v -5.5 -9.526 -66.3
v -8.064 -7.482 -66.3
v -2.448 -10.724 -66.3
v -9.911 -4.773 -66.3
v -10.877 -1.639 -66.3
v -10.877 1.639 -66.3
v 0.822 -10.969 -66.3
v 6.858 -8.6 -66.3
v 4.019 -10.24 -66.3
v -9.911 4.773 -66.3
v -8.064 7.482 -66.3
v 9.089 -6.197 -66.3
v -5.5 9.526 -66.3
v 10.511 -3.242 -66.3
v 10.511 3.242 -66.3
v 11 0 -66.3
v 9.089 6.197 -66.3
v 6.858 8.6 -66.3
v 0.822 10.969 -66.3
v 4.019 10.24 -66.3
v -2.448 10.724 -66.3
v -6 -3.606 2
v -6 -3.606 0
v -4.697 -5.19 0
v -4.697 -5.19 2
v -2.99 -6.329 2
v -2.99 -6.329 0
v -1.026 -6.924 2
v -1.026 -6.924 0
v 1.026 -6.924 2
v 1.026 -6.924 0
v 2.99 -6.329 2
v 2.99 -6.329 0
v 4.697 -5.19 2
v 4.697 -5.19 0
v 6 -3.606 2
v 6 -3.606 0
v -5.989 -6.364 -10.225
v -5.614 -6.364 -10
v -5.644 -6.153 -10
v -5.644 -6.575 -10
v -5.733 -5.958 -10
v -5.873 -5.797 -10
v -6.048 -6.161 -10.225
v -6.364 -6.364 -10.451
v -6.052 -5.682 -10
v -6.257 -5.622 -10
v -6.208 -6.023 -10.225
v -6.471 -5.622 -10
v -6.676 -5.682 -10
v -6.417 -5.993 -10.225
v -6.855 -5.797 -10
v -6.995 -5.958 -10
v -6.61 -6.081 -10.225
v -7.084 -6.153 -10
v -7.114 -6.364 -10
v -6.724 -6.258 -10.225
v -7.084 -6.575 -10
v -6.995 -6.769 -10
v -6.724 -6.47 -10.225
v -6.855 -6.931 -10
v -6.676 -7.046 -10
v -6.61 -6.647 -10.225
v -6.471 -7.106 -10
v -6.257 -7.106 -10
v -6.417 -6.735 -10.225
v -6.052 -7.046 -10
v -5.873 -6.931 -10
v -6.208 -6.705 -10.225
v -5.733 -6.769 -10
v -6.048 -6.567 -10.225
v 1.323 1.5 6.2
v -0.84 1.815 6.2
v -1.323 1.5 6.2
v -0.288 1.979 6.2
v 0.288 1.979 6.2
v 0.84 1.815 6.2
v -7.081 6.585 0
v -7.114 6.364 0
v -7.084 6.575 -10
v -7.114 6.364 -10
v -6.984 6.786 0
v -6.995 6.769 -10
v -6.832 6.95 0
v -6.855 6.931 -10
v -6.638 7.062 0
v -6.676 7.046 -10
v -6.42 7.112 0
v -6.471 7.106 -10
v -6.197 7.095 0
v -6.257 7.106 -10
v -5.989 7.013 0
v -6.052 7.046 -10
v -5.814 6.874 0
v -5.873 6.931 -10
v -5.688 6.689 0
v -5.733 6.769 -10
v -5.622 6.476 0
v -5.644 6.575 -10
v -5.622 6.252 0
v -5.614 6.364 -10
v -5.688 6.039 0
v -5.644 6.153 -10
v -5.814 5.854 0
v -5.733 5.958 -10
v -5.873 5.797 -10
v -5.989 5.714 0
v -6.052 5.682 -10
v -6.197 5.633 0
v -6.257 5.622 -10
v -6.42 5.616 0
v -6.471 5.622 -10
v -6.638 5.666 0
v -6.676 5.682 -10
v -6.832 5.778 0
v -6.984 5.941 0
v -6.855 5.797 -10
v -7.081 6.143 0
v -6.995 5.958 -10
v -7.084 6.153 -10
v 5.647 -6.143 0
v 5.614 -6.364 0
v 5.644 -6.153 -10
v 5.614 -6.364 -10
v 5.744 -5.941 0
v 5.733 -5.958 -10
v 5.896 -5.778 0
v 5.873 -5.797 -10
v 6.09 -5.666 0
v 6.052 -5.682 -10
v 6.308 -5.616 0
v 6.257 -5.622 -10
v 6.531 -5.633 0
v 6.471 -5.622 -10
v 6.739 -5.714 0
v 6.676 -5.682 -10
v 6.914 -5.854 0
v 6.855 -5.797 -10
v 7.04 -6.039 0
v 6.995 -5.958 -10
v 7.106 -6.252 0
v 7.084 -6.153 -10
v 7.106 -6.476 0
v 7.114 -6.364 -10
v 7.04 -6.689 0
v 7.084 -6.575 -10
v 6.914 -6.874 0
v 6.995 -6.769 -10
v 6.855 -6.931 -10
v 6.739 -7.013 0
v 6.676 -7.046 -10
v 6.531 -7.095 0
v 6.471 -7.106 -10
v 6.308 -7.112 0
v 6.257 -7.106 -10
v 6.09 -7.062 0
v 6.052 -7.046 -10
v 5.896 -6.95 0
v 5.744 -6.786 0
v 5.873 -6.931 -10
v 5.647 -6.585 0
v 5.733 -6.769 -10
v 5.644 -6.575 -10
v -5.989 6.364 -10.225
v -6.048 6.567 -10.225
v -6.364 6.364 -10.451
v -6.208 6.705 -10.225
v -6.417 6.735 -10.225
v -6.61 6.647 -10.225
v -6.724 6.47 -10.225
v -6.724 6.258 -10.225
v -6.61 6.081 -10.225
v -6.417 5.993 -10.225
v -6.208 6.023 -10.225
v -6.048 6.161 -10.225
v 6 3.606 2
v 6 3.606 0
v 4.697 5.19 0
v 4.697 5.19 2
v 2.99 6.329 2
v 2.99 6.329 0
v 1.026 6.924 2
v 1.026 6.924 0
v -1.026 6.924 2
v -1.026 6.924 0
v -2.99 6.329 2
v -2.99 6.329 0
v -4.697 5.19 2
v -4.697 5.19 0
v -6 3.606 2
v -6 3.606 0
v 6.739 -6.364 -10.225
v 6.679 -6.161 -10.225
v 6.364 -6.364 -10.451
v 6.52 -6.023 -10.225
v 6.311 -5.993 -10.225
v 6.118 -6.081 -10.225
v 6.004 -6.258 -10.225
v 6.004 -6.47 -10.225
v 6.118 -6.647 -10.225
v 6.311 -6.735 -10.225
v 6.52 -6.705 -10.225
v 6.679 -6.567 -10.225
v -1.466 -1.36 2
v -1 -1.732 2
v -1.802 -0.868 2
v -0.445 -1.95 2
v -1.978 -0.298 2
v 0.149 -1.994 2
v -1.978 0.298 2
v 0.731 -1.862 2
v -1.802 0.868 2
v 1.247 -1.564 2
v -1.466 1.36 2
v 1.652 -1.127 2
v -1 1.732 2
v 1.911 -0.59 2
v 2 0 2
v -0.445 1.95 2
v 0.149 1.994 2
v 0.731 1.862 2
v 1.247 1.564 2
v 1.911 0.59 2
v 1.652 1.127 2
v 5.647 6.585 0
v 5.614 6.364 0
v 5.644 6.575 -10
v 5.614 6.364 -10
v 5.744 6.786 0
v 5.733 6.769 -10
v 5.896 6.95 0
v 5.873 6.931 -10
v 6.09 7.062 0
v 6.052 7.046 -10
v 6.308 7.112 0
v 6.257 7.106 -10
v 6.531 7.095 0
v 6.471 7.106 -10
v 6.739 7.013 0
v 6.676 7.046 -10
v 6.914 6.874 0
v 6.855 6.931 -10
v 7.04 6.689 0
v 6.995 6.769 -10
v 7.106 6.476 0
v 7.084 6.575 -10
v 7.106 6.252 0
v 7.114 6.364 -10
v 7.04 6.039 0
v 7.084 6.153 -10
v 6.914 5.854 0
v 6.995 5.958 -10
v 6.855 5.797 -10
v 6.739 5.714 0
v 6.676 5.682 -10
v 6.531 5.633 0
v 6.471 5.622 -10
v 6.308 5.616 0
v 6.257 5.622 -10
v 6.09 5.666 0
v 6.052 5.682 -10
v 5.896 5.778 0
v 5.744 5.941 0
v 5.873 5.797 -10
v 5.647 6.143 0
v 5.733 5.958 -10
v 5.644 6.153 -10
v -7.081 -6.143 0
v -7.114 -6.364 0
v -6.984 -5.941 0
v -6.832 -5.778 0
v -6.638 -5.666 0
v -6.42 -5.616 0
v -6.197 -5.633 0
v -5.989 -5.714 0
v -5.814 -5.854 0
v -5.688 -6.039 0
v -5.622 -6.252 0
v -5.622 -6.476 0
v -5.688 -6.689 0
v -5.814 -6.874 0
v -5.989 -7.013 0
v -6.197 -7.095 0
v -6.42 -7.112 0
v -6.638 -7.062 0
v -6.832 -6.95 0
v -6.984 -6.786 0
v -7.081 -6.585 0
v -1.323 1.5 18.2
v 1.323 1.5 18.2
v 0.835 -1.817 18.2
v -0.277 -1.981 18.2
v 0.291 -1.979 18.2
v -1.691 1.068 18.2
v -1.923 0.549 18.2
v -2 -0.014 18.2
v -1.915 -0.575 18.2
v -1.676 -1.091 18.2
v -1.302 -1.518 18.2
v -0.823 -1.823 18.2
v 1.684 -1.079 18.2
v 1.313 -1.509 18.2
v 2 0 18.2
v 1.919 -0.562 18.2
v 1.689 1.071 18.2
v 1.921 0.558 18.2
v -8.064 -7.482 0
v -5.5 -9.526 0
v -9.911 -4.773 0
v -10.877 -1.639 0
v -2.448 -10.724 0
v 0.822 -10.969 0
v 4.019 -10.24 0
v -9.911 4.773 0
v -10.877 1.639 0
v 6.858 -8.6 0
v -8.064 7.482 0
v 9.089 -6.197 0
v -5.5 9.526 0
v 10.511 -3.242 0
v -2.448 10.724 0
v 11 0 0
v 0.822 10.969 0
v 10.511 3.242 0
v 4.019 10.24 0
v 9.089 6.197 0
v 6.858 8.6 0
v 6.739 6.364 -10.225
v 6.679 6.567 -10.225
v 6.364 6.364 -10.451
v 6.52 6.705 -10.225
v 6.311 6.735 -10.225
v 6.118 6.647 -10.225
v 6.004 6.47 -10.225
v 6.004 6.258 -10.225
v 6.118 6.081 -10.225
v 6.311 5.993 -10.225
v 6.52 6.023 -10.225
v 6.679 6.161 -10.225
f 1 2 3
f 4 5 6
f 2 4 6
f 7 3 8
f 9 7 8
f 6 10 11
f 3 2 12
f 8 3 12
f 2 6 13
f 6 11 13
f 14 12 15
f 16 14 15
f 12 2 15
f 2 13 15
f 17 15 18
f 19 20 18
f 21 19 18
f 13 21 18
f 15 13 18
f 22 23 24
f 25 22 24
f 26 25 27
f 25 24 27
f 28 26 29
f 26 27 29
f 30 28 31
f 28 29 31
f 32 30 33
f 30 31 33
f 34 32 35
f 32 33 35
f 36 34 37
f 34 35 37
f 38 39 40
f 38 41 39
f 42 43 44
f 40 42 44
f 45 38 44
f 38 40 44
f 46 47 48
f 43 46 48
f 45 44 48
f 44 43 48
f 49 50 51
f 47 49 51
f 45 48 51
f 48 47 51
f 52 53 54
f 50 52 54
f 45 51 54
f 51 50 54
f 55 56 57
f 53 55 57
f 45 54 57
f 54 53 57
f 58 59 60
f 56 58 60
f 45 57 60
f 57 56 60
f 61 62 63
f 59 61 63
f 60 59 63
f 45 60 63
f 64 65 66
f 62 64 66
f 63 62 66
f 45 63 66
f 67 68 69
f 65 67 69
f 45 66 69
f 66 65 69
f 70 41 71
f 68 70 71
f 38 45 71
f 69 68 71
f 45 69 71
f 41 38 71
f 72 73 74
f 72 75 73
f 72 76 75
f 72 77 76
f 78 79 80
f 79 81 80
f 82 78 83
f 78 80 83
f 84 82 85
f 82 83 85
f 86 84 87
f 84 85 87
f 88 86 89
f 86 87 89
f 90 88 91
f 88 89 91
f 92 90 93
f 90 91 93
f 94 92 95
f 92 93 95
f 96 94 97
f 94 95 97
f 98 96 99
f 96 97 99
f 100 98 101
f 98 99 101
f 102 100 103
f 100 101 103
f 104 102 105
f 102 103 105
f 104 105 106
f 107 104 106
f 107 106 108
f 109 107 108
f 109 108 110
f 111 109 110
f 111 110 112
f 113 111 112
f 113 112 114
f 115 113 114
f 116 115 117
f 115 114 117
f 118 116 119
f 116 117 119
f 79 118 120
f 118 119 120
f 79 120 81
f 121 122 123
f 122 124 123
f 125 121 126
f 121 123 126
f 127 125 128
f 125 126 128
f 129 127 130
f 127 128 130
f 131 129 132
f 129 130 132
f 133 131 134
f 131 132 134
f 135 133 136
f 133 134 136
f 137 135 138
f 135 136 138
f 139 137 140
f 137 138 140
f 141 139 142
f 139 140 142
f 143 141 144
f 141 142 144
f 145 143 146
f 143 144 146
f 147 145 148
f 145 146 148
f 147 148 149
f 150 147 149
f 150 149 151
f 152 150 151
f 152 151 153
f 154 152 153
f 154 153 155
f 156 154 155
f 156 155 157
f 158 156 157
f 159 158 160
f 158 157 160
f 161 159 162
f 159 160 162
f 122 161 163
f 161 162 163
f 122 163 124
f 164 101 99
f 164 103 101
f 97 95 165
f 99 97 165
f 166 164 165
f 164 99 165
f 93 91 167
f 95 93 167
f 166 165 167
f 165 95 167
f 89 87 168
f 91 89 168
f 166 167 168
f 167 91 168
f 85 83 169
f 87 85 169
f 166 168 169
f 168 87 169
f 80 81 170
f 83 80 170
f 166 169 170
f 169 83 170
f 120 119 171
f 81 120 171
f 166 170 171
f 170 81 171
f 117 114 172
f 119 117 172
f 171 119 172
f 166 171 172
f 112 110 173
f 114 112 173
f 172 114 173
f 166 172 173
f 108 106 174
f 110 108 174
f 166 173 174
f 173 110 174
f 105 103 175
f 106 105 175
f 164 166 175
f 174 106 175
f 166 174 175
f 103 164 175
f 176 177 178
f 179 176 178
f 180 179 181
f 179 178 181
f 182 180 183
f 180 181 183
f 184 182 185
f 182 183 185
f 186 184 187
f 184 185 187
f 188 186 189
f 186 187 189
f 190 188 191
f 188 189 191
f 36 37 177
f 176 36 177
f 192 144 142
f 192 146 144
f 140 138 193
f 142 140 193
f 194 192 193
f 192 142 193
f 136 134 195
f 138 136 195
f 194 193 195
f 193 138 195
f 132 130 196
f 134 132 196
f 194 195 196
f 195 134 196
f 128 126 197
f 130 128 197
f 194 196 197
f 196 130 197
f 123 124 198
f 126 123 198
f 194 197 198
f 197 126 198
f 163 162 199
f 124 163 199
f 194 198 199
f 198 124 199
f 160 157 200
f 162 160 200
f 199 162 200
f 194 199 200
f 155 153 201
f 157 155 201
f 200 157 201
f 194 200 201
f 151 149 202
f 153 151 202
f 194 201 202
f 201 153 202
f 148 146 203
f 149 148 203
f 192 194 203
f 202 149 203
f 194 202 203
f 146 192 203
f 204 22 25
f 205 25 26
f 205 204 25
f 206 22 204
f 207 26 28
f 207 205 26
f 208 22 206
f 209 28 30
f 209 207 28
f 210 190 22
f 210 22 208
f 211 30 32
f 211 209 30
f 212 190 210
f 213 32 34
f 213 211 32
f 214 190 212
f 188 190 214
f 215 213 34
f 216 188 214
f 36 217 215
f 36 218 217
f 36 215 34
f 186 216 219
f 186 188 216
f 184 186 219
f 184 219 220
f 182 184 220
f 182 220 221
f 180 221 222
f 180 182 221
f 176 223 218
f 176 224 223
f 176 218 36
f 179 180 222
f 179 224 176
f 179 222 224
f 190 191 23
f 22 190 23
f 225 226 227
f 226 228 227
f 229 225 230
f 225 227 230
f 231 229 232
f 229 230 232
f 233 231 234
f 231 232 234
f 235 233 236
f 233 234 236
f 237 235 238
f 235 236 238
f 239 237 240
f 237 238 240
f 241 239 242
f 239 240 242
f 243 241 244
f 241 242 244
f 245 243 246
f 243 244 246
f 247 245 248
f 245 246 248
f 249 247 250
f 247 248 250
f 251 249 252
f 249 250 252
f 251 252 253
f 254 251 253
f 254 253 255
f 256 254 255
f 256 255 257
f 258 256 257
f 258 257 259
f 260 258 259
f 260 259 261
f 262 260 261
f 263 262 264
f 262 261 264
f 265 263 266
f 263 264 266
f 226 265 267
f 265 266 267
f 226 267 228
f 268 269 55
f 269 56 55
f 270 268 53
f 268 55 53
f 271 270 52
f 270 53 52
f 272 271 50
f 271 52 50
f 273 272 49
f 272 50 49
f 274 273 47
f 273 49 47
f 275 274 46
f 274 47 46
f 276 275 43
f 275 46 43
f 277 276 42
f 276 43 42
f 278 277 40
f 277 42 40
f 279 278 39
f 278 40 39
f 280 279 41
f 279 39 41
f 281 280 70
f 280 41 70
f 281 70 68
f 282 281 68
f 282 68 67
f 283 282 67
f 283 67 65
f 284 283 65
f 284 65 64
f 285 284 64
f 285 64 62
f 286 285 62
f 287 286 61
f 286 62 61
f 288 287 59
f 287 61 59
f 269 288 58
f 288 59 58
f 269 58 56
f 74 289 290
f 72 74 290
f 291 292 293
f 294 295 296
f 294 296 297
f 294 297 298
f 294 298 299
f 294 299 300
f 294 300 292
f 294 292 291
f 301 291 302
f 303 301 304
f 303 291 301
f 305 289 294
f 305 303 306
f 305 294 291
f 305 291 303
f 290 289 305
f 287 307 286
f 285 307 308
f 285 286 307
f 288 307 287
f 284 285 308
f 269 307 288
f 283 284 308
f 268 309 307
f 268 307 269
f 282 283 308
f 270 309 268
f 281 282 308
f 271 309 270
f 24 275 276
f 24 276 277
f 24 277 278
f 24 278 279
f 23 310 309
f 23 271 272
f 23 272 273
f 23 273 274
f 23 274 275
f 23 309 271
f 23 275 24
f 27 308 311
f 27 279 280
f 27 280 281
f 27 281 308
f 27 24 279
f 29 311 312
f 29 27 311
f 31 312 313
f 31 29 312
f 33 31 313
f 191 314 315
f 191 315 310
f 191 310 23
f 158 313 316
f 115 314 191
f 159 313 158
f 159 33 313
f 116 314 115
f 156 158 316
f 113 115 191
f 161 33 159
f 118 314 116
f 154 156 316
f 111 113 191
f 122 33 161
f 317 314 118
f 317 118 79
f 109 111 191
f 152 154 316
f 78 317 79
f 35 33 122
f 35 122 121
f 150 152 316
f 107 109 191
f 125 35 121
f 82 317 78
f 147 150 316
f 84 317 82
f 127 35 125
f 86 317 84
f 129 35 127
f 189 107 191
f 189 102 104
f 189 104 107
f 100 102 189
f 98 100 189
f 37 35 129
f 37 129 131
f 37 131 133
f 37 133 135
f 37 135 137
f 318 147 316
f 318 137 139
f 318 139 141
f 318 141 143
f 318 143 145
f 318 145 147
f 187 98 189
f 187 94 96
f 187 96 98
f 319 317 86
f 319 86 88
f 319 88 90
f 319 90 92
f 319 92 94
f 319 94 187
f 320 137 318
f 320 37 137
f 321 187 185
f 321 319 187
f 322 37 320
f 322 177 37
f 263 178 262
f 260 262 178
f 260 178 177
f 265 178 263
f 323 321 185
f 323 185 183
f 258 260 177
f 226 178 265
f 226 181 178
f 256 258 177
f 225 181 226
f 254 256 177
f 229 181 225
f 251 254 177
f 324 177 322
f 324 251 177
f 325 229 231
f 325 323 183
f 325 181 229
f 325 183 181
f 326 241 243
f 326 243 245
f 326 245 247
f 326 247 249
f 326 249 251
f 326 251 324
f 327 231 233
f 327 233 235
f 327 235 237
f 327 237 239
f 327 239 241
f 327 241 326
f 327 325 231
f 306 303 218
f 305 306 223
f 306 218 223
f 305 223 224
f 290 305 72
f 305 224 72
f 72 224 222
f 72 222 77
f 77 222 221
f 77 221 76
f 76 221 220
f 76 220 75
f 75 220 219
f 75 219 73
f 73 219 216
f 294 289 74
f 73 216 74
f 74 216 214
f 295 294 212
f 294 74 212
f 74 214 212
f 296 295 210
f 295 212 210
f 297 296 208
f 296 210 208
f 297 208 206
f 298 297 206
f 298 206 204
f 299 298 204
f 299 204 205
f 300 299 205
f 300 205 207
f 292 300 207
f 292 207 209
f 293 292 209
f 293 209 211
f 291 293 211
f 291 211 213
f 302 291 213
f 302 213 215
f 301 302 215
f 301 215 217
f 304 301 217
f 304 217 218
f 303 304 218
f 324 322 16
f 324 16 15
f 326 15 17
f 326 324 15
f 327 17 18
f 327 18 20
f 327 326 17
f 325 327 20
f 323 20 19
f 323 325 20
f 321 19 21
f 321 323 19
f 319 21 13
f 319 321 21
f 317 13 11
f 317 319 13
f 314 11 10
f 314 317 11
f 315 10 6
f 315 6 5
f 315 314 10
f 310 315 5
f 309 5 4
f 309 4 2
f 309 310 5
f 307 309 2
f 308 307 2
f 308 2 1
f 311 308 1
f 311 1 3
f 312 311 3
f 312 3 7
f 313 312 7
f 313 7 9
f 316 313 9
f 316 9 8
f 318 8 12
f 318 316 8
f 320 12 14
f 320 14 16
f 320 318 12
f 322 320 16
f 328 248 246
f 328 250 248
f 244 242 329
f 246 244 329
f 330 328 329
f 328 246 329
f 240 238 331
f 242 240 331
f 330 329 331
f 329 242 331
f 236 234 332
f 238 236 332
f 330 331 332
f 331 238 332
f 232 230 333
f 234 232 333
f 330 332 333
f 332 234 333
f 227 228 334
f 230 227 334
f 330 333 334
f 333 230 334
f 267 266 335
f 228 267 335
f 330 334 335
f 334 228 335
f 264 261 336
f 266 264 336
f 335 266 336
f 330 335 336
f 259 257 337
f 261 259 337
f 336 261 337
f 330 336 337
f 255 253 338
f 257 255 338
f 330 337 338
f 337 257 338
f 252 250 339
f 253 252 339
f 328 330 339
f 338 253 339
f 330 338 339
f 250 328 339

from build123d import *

# Parameters (mm, degrees)
F0_R     = 11
F1_DEPTH = 66.3
F3_DEPTH = 2
F4_R     = 2
F5_DEPTH = 16.2
F6_W     = 2.6457513111
F6_H     = 0.5
F7_DEPTH = 12
F9_D     = 1.5
F9_DEPTH = 10
F9_TIP   = 0.4506454643


with BuildPart() as f1:
    # F0 (on Top) → F1 (new body)
    with BuildSketch(Plane.XY):
        Circle(F0_R)
    extrude(amount=-F1_DEPTH)

    # F2 (on face) → F3 (join)
    with BuildSketch(Plane.XY):
        with BuildLine():
            ThreePointArc((6, 3.6055512755), (0, 7), (-6, 3.6055512755))
            Line((-6, 3.6055512755), (-6, -3.6055512755))
            ThreePointArc((-6, -3.6055512755), (0, -7), (6, -3.6055512755))
            Line((6, -3.6055512755), (6, 3.6055512755))
        make_face()
    extrude(amount=F3_DEPTH)

    # F4 (on face) → F5 (join)
    with BuildSketch(Plane.XY.offset(2)):
        Circle(F4_R)
    extrude(amount=F5_DEPTH)

    # F6 (on face) → F7 (cut)
    with BuildSketch(Plane.XY.offset(18.2)):
        with Locations((0, 1.75)):
            Rectangle(F6_W, F6_H)
    extrude(amount=-F7_DEPTH, mode=Mode.SUBTRACT)

    # F9
    with Locations(Plane.XY):
        with Locations((-6.3639610307, 6.3639610307), (-6.3639610307, -6.3639610307), (6.3639610307, 6.3639610307), (6.3639610307, -6.3639610307)):
            Hole(F9_D / 2, depth=F9_DEPTH)
            with Locations((0, 0, -(F9_DEPTH + F9_TIP / 2))):  # 118° drill point
                Cone(0, F9_D / 2, F9_TIP, mode=Mode.SUBTRACT)


solid = f1.part
